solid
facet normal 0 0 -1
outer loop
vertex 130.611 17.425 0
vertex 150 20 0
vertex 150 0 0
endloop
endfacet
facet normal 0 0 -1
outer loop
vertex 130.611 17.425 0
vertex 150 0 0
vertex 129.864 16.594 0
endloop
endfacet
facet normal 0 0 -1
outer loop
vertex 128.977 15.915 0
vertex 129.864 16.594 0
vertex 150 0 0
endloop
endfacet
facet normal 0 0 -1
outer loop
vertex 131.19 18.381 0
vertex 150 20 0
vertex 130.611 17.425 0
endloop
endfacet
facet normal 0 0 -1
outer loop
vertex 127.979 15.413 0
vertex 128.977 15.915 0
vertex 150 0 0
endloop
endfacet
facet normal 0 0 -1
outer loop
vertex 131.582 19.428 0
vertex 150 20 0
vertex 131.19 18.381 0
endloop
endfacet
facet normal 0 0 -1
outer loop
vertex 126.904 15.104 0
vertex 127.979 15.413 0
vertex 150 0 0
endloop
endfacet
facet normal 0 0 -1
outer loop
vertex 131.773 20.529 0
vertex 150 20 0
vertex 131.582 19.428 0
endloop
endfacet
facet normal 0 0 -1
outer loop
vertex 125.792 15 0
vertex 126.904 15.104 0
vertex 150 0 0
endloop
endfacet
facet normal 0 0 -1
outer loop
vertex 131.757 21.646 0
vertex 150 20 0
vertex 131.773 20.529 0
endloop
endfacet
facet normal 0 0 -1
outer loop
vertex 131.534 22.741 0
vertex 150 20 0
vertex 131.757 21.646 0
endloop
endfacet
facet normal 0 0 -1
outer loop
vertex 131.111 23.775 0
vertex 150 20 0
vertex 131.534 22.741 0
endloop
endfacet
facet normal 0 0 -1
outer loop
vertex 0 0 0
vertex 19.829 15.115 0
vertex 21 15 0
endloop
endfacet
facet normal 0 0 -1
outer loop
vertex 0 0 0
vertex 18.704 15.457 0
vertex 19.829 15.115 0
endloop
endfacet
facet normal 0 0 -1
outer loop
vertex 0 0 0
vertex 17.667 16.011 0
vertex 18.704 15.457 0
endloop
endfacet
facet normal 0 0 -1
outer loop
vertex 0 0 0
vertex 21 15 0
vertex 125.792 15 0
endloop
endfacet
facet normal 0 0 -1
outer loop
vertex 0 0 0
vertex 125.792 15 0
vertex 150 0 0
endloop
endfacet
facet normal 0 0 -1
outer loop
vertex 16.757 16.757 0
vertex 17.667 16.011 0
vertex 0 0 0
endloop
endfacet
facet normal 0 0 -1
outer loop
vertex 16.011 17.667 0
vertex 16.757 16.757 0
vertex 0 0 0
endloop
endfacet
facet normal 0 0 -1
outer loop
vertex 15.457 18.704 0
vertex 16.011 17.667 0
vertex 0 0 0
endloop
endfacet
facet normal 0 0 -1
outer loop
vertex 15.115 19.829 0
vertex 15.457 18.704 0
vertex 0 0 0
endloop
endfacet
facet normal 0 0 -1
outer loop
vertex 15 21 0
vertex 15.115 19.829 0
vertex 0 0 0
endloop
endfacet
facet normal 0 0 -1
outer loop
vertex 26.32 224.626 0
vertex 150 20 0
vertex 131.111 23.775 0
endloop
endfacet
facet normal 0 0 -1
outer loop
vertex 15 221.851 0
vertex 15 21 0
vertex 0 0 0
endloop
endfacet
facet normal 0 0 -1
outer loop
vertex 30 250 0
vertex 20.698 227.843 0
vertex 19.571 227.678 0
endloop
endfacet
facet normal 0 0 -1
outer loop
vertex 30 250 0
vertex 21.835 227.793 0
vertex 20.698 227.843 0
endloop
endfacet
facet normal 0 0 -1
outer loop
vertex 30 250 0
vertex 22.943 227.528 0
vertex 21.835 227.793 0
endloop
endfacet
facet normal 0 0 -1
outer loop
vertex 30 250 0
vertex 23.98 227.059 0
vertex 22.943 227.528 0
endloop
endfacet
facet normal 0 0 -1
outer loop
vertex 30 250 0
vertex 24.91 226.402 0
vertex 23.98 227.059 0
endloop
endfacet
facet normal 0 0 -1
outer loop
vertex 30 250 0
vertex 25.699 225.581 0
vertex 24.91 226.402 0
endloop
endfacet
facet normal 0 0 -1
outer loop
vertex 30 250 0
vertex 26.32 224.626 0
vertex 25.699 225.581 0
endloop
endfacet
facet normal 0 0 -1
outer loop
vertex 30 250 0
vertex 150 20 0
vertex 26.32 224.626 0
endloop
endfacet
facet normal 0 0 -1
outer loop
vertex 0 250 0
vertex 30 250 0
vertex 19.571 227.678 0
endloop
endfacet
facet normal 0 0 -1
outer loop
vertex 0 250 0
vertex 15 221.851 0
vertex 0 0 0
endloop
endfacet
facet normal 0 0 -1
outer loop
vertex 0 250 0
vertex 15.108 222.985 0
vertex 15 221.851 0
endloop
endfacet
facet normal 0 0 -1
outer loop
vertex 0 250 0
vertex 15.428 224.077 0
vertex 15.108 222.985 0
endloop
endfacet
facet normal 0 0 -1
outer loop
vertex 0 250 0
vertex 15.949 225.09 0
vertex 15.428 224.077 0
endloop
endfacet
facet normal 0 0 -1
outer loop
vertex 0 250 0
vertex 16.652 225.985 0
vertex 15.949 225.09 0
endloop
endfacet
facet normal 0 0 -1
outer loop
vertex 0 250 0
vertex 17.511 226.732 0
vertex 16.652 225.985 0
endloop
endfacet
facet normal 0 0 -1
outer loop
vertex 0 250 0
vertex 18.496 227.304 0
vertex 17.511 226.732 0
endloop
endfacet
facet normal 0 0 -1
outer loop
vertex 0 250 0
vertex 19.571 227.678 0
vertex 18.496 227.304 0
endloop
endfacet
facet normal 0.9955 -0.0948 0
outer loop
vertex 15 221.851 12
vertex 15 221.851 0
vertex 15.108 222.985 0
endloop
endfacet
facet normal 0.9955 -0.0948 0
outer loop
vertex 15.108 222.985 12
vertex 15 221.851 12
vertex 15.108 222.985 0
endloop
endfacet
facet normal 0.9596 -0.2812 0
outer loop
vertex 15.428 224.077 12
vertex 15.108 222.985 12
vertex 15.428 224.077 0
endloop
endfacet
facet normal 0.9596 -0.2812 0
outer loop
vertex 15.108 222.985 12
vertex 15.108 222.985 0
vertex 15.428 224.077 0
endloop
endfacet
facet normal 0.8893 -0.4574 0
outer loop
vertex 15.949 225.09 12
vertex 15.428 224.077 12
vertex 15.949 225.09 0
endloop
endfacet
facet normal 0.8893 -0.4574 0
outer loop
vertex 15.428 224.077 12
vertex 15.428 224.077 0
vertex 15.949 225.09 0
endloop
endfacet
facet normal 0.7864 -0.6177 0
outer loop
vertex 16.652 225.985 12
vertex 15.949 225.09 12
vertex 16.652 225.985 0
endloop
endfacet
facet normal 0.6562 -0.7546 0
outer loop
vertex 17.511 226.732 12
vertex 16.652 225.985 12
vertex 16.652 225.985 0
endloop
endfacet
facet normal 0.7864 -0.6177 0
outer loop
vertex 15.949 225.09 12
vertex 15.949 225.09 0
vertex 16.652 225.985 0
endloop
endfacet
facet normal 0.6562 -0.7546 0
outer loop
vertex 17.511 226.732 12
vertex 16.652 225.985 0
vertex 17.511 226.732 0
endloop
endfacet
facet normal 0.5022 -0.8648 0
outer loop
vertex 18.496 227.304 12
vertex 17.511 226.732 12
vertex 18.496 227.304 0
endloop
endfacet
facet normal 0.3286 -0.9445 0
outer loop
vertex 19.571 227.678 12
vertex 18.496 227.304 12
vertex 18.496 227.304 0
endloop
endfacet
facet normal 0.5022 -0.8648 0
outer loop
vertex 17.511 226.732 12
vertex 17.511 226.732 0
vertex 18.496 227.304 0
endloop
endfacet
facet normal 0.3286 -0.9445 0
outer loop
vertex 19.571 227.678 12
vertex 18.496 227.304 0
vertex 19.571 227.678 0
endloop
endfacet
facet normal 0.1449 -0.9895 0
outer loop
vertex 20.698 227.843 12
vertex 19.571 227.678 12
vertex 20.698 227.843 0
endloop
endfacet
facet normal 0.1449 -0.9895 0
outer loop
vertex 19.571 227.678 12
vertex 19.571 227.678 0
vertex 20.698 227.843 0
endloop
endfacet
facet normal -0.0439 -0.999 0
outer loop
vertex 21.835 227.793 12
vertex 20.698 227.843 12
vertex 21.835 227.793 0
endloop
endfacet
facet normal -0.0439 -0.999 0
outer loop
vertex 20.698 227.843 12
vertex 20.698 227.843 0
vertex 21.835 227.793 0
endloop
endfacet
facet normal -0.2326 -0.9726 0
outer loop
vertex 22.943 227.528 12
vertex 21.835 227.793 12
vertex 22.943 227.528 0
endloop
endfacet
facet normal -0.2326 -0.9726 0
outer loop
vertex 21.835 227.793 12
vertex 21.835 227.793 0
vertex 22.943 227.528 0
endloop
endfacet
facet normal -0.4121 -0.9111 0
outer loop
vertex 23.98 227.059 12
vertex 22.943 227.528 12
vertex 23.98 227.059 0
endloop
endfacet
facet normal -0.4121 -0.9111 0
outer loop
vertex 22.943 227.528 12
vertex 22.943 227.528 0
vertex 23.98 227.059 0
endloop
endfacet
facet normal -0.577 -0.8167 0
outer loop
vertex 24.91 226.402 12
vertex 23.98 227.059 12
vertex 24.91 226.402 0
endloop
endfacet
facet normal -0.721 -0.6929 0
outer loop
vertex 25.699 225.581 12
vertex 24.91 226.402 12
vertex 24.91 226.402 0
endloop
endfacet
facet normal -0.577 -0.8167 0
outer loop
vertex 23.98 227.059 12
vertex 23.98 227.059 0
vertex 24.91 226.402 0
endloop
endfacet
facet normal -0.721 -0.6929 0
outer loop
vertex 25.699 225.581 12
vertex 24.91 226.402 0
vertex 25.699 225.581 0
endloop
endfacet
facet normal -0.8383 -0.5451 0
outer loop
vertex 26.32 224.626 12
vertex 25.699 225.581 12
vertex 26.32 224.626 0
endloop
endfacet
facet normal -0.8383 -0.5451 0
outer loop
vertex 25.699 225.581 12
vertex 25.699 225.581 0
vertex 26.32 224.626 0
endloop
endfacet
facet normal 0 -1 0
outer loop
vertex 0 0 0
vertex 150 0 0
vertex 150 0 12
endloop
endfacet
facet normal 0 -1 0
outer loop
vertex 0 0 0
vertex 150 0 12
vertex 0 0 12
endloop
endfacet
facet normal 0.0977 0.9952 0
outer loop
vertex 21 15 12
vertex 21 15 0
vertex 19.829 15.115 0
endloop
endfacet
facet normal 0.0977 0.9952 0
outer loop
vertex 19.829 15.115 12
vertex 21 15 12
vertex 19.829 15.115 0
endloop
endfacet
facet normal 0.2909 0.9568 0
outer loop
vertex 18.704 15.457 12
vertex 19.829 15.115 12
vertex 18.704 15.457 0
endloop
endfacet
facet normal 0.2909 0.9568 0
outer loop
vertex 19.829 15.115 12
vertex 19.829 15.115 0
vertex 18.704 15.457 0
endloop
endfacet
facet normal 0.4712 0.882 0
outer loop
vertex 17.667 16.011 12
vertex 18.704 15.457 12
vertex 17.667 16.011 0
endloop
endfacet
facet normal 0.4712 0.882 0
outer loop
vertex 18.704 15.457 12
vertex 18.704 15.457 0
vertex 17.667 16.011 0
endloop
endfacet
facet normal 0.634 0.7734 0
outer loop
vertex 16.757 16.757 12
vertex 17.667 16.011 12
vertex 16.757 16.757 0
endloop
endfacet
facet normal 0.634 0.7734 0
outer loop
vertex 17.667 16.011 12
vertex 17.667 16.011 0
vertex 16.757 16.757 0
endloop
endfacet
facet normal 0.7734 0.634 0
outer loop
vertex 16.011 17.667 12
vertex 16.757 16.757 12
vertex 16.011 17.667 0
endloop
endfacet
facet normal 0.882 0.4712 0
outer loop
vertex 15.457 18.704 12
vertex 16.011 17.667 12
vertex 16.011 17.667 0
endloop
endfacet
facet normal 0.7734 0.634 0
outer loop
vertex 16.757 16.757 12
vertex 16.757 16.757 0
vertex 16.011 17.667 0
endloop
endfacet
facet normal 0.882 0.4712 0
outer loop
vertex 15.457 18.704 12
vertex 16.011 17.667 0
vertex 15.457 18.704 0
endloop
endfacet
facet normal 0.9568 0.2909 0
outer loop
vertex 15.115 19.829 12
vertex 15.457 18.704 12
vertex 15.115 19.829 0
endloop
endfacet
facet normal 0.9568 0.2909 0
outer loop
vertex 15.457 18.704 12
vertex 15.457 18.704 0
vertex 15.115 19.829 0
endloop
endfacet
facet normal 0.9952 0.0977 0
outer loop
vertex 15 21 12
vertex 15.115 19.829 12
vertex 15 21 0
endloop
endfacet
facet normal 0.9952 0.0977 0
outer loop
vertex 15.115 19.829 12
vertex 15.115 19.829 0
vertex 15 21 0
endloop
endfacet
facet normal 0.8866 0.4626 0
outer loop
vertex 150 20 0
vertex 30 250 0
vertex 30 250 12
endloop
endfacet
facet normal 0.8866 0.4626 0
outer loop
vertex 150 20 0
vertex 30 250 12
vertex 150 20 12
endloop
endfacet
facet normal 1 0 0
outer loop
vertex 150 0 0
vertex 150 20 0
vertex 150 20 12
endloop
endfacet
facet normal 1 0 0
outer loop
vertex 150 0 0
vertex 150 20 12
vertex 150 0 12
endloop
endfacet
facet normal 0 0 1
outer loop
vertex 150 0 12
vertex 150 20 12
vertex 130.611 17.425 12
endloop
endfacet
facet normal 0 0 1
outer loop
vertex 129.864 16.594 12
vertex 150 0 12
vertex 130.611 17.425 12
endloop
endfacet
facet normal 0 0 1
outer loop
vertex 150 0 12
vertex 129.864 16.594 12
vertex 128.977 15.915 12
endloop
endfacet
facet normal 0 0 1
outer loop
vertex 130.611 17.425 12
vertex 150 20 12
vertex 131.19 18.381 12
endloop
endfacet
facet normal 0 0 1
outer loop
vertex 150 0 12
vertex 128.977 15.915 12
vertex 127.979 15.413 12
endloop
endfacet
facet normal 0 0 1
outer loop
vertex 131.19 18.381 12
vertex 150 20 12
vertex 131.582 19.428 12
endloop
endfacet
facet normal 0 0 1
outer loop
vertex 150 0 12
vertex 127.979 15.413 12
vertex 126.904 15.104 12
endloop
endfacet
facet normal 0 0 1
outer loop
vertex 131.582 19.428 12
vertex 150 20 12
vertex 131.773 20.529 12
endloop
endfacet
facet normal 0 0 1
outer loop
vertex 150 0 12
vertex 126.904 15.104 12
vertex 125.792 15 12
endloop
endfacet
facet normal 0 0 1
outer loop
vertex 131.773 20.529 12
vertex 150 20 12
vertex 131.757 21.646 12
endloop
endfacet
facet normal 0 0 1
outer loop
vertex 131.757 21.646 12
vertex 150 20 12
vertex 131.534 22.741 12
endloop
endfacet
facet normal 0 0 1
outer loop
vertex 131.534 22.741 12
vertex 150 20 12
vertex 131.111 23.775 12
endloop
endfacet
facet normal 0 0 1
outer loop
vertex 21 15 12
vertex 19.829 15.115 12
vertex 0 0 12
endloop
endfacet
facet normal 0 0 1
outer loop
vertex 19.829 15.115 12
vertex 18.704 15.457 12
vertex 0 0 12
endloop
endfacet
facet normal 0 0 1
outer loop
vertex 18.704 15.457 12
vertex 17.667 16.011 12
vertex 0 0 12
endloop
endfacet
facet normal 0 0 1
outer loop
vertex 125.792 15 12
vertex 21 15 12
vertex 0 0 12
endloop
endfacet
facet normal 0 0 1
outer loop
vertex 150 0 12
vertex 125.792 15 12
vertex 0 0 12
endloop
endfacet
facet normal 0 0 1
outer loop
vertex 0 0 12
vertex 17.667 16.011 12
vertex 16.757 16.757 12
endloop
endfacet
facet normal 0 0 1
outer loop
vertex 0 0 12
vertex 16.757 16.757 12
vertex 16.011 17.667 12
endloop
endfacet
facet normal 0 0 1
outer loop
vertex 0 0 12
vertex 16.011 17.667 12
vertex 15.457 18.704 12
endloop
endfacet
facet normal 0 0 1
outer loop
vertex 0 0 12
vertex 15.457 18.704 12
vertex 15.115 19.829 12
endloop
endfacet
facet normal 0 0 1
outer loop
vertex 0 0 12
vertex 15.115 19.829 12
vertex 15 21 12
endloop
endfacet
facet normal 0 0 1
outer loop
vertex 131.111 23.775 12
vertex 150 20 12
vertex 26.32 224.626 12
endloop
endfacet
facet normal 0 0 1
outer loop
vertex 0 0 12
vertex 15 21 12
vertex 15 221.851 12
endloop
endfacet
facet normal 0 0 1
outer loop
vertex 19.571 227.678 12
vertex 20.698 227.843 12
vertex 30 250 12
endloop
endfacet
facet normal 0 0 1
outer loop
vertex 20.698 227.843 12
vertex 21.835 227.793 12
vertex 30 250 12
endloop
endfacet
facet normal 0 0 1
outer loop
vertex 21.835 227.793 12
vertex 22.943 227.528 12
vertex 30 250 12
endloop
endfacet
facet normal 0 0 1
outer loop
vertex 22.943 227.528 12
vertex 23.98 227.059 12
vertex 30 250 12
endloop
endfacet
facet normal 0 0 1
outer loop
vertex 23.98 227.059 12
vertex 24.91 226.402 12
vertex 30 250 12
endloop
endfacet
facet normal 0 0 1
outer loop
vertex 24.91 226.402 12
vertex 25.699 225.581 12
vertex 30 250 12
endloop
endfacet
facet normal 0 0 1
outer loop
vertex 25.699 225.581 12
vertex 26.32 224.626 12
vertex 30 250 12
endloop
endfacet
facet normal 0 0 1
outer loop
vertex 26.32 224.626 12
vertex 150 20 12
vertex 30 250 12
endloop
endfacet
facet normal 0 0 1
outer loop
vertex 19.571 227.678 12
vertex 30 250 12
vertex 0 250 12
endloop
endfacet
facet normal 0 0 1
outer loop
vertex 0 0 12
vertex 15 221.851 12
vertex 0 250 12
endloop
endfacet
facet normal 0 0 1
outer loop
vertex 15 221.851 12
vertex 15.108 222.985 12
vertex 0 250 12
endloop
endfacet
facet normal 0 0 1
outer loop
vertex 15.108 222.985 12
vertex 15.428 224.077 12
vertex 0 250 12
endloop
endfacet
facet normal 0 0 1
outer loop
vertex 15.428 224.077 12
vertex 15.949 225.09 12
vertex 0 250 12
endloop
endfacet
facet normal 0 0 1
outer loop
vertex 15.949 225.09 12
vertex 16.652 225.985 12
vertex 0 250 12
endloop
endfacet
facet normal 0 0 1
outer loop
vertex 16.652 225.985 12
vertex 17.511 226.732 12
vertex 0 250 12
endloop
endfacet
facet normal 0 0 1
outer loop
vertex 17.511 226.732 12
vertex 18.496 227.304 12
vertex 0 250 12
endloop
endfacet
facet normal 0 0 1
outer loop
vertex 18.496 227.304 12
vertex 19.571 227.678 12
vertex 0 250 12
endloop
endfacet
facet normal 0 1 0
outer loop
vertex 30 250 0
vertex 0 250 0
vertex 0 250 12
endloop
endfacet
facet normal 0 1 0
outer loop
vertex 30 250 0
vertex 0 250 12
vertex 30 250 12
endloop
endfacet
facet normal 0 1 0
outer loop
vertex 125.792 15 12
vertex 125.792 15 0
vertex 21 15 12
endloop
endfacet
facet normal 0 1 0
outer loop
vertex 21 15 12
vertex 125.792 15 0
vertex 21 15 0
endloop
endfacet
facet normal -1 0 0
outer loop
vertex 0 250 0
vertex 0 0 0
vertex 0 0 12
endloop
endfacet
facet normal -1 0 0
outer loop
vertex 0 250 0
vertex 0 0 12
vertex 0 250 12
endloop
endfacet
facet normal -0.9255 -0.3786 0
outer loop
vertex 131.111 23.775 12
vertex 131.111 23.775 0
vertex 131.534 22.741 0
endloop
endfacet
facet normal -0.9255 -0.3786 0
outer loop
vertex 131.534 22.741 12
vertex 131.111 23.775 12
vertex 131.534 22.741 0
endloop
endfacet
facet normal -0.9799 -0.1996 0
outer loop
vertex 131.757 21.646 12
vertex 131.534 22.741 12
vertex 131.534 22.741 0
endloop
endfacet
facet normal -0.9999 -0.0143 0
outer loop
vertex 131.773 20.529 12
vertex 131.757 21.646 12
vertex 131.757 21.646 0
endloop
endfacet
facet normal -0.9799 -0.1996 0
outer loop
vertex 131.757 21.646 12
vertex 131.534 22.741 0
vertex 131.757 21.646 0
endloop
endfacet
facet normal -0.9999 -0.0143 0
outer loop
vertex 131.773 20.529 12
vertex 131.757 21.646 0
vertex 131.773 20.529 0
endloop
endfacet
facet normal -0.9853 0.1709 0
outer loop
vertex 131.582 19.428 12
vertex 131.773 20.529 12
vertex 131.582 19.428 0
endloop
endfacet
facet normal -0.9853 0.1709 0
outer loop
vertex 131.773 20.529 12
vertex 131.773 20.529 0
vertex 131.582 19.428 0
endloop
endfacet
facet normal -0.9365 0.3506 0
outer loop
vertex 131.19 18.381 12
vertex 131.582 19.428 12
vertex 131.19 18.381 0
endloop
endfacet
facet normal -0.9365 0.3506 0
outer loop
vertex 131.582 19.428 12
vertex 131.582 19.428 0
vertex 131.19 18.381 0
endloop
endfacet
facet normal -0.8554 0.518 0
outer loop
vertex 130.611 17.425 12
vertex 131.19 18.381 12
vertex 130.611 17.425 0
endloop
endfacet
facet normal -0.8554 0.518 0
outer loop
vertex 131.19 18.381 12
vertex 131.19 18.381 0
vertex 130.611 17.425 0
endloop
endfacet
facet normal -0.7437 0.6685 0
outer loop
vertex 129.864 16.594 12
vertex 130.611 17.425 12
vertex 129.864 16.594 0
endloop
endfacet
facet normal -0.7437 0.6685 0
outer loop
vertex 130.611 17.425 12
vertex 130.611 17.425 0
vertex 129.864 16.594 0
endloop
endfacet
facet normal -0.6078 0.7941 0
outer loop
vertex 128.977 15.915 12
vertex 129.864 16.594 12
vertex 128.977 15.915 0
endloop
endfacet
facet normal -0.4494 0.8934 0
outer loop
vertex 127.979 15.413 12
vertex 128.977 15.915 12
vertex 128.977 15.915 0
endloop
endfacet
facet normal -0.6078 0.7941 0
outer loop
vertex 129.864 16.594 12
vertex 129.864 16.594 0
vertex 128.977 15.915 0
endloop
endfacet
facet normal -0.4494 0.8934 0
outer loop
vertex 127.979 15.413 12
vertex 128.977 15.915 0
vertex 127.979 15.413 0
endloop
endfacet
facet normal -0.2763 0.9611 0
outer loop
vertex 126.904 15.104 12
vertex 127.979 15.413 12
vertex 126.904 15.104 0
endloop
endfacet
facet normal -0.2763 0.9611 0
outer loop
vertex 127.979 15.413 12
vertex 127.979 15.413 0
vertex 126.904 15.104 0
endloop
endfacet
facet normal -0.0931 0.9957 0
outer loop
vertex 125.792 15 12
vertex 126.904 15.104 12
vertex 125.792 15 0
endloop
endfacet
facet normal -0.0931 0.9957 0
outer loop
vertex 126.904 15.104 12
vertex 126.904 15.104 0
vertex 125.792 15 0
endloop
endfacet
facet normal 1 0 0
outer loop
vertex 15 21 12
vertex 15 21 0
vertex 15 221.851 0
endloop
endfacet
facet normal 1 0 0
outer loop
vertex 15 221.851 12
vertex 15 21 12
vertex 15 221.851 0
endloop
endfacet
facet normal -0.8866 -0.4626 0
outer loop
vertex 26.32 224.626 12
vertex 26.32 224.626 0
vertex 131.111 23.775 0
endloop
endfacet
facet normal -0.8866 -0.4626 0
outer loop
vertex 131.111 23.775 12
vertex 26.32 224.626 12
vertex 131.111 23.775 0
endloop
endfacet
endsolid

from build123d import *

# Parameters (mm, degrees)
BOSS_EXTRUDE1_DEPTH = 12


with BuildPart() as part:
    # Sketch1 → Boss-Extrude1 (new body)
    with BuildSketch(Plane.XY):
        Polygon((150, 0), (0, 0), (0, 250), (30, 250), (150, 20), align=None)
        with BuildLine():
            Line((26.319509077, 224.626469841), (131.111373669, 23.77539604))
            ThreePointArc((131.111373669, 23.77539604), (130.922769787, 17.88972479), (125.791864592, 15))
            Line((125.791864592, 15), (21, 15))
            ThreePointArc((21, 15), (16.757359313, 16.757359313), (15, 21))
            Line((15, 21), (15, 221.851073801))
            ThreePointArc((15, 221.851073801), (19.571198835, 227.67846835), (26.319509077, 224.626469841))
        make_face(mode=Mode.SUBTRACT)
    extrude(amount=BOSS_EXTRUDE1_DEPTH)


solid = part.part
